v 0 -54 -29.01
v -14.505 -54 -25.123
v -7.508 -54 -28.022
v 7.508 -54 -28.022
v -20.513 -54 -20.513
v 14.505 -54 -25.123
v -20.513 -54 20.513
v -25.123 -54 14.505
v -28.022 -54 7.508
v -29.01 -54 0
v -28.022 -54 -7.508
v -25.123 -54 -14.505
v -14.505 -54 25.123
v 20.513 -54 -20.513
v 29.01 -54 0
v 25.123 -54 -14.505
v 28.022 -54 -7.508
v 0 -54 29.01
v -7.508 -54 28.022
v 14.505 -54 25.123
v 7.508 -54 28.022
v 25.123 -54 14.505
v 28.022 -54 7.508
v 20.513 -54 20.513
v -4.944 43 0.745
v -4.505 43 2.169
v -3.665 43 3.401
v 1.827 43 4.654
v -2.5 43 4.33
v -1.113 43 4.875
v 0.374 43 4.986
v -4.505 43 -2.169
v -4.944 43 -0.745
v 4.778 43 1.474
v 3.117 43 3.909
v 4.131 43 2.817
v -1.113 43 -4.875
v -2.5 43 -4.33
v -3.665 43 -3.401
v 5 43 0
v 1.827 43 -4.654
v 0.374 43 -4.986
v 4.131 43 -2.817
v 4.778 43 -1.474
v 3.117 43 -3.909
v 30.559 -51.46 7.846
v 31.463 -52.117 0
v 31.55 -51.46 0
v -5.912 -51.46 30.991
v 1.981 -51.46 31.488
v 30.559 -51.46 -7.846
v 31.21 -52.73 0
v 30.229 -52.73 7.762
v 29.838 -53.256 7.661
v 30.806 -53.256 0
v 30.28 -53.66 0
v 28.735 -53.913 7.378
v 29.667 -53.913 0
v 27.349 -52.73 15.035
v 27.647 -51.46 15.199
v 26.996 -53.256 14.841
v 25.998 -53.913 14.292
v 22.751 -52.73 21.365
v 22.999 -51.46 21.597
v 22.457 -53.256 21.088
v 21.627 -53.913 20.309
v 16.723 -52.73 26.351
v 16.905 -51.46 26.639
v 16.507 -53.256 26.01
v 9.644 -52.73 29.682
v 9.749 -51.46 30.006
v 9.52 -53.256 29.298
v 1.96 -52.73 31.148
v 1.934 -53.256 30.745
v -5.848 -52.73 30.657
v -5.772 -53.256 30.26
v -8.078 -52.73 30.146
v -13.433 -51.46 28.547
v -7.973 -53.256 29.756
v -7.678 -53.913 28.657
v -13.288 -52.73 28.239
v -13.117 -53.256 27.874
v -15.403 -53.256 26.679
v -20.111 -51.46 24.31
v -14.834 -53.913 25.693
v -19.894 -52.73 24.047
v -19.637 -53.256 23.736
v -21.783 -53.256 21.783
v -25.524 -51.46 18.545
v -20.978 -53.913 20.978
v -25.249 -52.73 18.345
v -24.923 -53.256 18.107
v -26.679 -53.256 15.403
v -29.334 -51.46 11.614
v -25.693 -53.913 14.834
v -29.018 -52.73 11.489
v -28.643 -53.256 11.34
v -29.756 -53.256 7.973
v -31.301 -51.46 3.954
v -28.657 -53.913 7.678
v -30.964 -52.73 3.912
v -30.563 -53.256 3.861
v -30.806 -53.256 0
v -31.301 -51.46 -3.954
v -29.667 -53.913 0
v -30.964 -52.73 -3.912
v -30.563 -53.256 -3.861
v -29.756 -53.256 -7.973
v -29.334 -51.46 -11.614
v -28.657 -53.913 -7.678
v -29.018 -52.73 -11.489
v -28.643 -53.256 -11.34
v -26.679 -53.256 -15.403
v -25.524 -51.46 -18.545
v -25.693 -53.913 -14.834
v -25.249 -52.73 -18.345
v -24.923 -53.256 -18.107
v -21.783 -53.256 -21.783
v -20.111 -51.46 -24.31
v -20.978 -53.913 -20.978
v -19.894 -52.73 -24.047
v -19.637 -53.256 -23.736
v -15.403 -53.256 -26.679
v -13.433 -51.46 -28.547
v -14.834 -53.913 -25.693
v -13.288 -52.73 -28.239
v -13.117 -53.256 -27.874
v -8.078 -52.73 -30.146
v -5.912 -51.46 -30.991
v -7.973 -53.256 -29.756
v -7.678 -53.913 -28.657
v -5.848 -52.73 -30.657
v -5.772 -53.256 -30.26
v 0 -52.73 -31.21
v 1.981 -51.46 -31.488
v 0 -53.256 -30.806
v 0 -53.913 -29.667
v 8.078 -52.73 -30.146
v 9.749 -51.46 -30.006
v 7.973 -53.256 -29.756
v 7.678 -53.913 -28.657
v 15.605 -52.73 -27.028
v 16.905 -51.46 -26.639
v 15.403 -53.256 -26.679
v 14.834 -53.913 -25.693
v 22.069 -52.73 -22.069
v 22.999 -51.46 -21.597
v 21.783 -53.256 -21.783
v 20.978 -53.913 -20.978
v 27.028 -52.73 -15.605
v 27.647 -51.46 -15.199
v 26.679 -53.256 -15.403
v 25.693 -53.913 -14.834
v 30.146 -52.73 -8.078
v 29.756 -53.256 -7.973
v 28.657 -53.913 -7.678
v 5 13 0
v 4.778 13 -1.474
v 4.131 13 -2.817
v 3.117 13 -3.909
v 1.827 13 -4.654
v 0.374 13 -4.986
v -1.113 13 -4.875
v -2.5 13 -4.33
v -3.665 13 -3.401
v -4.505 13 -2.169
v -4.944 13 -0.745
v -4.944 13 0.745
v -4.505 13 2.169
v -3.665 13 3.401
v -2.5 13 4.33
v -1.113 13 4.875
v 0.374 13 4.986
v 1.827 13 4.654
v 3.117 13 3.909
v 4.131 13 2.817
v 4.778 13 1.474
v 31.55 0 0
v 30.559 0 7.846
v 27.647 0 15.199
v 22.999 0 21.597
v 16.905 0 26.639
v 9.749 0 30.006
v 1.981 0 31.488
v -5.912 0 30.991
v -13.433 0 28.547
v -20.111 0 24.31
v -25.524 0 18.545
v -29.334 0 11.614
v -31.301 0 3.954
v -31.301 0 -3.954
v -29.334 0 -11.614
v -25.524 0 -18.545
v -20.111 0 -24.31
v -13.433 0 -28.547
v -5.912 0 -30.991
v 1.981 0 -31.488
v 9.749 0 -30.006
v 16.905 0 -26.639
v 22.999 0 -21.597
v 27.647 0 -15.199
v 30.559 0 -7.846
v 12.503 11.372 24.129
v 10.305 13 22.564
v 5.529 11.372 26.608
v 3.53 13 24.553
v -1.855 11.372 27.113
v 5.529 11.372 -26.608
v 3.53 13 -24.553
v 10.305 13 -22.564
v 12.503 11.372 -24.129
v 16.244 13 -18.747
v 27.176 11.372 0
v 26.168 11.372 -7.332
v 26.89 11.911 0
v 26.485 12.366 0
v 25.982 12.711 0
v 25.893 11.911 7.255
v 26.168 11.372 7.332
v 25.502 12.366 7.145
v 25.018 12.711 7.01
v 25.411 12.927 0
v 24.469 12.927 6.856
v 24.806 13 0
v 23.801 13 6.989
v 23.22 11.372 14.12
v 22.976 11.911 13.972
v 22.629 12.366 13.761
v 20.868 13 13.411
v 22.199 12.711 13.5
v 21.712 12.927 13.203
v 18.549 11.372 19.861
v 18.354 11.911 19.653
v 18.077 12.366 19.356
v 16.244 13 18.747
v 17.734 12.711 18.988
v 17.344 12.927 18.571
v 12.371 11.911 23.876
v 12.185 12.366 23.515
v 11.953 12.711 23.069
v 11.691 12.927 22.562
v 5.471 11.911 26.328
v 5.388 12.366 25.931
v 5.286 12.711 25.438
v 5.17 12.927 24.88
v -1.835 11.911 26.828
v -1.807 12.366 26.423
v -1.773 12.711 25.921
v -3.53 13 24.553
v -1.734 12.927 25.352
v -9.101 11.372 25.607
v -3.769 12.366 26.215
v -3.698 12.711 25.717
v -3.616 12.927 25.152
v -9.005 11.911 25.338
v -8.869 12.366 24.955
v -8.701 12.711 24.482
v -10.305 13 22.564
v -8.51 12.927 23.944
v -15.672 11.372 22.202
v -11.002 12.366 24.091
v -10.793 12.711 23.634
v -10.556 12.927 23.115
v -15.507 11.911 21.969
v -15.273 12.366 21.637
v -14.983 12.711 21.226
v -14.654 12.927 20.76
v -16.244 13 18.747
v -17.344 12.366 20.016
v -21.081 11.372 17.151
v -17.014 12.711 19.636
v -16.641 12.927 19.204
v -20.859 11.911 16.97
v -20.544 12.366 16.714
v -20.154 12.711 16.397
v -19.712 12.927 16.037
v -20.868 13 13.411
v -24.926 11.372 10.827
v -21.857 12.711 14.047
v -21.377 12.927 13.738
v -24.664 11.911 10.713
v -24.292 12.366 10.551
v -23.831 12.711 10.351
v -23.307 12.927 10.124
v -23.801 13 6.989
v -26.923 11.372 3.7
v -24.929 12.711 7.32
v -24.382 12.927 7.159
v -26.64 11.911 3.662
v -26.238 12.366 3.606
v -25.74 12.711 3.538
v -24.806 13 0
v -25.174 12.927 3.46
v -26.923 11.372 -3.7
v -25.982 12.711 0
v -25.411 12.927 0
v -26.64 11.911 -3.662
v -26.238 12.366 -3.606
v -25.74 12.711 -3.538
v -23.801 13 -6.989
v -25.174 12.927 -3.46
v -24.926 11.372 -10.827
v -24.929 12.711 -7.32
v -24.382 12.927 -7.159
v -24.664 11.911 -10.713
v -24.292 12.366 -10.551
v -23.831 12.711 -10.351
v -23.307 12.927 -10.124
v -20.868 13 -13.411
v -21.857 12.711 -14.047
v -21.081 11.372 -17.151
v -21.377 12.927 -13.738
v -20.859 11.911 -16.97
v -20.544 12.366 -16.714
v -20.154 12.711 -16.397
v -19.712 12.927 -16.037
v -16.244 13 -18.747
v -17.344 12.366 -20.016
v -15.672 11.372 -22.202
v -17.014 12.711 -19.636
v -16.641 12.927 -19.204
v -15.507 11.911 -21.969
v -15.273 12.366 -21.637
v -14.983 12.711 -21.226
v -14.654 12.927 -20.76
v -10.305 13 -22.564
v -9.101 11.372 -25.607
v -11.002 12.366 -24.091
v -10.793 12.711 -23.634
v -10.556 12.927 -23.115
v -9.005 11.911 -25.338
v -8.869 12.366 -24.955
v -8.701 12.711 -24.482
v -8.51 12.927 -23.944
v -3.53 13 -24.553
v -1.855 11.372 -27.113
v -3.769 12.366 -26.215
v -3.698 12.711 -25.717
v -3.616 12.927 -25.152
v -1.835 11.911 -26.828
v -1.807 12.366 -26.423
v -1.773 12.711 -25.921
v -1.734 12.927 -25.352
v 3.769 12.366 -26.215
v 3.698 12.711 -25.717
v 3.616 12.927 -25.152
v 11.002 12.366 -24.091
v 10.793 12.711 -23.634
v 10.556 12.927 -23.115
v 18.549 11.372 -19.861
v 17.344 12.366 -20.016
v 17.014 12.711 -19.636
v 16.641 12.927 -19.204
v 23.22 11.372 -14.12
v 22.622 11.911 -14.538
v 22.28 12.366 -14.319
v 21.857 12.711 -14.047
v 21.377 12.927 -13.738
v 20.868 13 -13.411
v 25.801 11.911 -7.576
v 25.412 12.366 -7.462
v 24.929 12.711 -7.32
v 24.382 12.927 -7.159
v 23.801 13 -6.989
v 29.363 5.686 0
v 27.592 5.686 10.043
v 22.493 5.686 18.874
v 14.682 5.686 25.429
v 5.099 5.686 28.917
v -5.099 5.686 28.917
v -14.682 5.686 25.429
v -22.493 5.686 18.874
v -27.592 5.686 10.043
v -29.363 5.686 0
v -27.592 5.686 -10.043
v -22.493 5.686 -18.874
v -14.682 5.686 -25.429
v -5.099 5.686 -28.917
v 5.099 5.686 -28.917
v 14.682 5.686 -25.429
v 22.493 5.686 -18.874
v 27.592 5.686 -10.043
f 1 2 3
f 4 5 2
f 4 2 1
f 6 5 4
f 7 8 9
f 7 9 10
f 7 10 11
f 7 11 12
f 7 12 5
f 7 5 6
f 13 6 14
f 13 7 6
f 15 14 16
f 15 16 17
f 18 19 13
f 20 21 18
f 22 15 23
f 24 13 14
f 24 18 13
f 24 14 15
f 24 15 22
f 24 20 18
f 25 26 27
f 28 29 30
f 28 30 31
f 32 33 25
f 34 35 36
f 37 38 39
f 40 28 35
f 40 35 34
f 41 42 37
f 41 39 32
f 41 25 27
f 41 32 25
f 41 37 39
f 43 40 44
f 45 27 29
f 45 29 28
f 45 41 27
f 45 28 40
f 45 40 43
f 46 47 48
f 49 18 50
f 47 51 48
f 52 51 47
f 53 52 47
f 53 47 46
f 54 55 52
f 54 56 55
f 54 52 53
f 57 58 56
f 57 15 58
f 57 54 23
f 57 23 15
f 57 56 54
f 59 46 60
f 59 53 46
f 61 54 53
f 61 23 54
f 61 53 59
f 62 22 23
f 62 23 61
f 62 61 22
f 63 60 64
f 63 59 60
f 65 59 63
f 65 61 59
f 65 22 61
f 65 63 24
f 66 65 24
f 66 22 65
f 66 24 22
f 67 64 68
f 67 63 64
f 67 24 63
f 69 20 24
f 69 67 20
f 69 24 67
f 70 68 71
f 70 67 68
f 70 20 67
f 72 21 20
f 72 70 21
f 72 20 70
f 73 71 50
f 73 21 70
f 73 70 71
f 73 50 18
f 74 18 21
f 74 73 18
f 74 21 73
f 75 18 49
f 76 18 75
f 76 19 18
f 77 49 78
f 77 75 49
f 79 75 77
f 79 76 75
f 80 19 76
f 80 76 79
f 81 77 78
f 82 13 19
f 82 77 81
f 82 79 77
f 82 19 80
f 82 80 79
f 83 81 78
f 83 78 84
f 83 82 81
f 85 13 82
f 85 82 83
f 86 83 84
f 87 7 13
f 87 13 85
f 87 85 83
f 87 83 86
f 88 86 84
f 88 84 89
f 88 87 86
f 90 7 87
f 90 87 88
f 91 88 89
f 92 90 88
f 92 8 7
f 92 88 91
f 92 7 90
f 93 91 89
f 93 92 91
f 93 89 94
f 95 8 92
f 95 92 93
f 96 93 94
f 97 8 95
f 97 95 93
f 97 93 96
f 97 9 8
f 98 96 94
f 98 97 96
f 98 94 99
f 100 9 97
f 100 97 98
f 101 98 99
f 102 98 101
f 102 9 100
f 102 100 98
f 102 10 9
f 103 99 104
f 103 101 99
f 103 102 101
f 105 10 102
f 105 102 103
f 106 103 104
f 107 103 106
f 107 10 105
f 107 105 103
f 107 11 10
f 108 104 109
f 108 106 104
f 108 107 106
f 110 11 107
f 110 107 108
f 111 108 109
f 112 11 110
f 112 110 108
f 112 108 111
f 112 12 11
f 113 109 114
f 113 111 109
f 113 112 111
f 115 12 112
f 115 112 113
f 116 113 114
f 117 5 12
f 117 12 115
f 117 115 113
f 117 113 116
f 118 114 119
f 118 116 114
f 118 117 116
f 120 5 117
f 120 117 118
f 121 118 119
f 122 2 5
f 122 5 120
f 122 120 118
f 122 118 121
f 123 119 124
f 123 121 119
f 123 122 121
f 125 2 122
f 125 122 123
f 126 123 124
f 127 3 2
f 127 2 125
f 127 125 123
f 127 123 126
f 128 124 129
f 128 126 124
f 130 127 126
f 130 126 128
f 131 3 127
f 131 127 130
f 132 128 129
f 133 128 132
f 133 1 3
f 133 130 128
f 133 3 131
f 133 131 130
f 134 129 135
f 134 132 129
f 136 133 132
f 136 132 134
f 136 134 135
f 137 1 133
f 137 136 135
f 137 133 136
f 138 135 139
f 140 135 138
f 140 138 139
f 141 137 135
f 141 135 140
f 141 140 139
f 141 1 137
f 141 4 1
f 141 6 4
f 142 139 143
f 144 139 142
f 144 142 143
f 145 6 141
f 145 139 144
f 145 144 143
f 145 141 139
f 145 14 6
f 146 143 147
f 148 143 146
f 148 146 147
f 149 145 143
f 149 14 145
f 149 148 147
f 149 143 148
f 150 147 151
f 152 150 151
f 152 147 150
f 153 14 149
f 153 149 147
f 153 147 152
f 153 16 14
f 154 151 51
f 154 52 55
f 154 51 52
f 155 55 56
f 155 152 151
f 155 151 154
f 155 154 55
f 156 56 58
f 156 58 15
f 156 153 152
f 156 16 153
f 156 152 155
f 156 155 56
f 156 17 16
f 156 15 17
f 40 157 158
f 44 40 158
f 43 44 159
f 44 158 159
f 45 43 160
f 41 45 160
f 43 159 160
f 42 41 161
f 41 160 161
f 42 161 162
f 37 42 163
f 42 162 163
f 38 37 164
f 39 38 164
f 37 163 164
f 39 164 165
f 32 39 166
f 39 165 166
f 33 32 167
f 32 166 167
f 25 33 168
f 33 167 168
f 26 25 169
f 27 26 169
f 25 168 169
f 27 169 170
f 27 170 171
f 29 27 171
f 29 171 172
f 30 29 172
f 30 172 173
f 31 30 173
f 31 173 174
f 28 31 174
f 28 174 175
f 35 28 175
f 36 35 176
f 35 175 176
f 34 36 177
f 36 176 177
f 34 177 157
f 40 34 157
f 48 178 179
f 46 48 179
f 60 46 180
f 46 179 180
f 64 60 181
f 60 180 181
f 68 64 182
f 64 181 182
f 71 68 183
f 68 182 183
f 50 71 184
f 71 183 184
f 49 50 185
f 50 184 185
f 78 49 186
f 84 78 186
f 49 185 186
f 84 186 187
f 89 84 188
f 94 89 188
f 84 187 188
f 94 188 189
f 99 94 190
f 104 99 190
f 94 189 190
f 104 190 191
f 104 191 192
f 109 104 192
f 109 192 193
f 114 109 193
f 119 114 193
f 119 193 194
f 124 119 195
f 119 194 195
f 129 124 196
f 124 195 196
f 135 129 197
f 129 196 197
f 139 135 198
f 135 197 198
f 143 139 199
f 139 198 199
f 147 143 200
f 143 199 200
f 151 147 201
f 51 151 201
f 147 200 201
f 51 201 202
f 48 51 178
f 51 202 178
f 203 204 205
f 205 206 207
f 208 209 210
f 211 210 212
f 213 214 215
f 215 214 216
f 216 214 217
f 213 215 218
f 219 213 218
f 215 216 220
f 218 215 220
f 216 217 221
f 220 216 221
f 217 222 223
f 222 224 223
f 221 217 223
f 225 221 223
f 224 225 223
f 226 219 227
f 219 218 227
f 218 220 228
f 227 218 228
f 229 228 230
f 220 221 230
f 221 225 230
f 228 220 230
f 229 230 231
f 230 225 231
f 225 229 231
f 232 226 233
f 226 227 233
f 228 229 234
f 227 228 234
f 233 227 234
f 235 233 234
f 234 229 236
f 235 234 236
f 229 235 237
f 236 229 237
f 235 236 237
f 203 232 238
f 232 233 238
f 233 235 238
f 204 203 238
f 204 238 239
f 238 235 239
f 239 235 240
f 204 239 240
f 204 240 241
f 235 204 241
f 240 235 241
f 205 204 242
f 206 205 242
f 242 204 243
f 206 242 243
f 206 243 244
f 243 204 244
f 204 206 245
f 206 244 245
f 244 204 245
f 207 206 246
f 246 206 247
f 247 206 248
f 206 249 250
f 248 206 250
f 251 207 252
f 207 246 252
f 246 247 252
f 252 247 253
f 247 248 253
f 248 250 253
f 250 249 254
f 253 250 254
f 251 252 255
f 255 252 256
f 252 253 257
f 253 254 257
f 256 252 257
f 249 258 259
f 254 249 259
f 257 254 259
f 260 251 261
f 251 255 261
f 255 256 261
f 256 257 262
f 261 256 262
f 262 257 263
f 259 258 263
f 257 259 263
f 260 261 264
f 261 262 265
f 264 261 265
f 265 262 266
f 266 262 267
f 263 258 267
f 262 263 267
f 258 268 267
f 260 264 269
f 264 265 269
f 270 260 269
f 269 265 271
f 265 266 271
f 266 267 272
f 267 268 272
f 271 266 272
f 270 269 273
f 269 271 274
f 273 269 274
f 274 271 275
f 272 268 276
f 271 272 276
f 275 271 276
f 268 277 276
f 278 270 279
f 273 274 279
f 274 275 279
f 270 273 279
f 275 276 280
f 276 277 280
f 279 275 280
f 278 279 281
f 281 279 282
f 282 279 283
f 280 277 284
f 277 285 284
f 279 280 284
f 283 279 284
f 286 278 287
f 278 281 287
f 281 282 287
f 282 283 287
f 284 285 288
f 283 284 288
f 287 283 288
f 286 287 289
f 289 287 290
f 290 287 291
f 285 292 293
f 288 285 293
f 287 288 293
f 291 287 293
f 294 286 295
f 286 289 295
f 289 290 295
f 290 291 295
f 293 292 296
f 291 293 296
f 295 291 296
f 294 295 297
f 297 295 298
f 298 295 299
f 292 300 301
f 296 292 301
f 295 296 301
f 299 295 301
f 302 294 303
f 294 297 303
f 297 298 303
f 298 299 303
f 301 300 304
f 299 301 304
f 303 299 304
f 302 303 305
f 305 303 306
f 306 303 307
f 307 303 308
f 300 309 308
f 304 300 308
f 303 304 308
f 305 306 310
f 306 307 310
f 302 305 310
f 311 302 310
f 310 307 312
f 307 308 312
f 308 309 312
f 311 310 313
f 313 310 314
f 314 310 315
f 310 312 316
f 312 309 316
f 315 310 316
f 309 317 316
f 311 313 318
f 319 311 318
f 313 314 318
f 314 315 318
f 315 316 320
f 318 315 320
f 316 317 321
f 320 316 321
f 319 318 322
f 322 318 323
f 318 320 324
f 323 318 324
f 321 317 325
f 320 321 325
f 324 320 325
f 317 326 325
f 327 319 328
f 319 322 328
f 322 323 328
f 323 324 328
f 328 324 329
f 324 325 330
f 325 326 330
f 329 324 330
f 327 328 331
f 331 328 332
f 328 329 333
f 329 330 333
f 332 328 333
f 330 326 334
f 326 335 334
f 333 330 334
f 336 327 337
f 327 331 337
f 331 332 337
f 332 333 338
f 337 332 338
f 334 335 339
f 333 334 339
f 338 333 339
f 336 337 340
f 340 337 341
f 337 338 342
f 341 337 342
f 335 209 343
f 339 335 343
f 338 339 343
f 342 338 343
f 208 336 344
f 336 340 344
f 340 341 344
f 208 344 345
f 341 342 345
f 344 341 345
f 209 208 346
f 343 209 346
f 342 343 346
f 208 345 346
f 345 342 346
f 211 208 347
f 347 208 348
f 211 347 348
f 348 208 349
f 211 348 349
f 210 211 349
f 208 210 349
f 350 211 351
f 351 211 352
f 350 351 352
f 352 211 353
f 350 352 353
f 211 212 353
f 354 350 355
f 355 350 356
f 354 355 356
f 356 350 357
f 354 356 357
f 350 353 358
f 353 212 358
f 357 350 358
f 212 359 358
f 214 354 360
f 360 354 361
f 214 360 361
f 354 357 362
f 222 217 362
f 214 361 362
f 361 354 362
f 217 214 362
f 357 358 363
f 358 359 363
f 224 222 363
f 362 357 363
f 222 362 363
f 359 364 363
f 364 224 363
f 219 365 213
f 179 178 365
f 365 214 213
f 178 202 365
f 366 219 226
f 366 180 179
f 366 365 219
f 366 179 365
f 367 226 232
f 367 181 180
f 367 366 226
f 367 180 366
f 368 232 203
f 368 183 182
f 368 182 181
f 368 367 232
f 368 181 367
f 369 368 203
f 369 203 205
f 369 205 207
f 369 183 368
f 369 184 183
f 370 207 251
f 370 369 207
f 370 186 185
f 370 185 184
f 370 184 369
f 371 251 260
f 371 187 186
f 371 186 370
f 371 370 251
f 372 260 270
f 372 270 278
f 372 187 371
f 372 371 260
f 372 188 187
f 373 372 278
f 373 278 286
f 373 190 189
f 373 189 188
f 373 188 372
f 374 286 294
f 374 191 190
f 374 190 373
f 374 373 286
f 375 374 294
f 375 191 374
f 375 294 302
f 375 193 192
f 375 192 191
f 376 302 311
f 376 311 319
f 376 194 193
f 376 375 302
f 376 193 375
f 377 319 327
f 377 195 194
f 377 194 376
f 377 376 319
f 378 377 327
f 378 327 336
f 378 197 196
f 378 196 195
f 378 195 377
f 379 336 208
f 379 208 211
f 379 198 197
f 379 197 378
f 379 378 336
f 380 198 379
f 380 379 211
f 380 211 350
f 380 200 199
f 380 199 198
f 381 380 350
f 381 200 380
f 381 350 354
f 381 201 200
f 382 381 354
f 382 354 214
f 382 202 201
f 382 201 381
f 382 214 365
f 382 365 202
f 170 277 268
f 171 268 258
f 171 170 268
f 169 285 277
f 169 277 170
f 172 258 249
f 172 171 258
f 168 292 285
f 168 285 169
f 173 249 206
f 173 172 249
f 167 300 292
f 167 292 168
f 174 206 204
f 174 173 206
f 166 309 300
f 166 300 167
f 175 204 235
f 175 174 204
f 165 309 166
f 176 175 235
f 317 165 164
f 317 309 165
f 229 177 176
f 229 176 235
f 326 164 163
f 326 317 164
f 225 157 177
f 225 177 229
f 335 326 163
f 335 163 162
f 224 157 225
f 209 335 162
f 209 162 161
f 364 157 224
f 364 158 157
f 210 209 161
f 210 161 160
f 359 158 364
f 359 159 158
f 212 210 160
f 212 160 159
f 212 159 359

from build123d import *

# Parameters (mm, degrees)
SKETCH3_R           = 31.55
BOSS_EXTRUDE1_DEPTH = 13
SKETCH6_R           = 31.55
BOSS_EXTRUDE2_DEPTH = 54
FILLET1_R           = 2.54
SKETCH7_R           = 5
BOSS_EXTRUDE3_DEPTH = 30


with BuildPart() as part:
    # Sketch3 → Boss-Extrude1 (new body)
    with BuildSketch(Plane(origin=(0, 0, 0), x_dir=(1, 0, 0), z_dir=(0, 1, 0))):
        Circle(SKETCH3_R)
    extrude(amount=BOSS_EXTRUDE1_DEPTH)

    # Sketch5 → Cut-Revolve1 (revolve, cut)
    with BuildSketch(Plane.XY):
        Polygon((31.55, 13), (26.55, 13), (31.55, 0), align=None)
    revolve(axis=Axis((0, 13, 0), (0, -1, 0)), mode=Mode.SUBTRACT)

    # Sketch6 → Boss-Extrude2 (add)
    with BuildSketch(Plane.XZ):
        Circle(SKETCH6_R)
    extrude(amount=BOSS_EXTRUDE2_DEPTH)

    # Fillet1
    fillet1_edges = [part.edges().sort_by_distance(p)[0] for p in [
        (-31.55, -54, 0),
        (-26.55, 13, 0),
    ]]
    fillet(fillet1_edges, radius=FILLET1_R)

    # Sketch7 → Boss-Extrude3 (add)
    with BuildSketch(Plane(origin=(0, 13, 0), x_dir=(1, 0, 0), z_dir=(0, 1, 0))):
        Circle(SKETCH7_R)
    extrude(amount=BOSS_EXTRUDE3_DEPTH)


solid = part.part
